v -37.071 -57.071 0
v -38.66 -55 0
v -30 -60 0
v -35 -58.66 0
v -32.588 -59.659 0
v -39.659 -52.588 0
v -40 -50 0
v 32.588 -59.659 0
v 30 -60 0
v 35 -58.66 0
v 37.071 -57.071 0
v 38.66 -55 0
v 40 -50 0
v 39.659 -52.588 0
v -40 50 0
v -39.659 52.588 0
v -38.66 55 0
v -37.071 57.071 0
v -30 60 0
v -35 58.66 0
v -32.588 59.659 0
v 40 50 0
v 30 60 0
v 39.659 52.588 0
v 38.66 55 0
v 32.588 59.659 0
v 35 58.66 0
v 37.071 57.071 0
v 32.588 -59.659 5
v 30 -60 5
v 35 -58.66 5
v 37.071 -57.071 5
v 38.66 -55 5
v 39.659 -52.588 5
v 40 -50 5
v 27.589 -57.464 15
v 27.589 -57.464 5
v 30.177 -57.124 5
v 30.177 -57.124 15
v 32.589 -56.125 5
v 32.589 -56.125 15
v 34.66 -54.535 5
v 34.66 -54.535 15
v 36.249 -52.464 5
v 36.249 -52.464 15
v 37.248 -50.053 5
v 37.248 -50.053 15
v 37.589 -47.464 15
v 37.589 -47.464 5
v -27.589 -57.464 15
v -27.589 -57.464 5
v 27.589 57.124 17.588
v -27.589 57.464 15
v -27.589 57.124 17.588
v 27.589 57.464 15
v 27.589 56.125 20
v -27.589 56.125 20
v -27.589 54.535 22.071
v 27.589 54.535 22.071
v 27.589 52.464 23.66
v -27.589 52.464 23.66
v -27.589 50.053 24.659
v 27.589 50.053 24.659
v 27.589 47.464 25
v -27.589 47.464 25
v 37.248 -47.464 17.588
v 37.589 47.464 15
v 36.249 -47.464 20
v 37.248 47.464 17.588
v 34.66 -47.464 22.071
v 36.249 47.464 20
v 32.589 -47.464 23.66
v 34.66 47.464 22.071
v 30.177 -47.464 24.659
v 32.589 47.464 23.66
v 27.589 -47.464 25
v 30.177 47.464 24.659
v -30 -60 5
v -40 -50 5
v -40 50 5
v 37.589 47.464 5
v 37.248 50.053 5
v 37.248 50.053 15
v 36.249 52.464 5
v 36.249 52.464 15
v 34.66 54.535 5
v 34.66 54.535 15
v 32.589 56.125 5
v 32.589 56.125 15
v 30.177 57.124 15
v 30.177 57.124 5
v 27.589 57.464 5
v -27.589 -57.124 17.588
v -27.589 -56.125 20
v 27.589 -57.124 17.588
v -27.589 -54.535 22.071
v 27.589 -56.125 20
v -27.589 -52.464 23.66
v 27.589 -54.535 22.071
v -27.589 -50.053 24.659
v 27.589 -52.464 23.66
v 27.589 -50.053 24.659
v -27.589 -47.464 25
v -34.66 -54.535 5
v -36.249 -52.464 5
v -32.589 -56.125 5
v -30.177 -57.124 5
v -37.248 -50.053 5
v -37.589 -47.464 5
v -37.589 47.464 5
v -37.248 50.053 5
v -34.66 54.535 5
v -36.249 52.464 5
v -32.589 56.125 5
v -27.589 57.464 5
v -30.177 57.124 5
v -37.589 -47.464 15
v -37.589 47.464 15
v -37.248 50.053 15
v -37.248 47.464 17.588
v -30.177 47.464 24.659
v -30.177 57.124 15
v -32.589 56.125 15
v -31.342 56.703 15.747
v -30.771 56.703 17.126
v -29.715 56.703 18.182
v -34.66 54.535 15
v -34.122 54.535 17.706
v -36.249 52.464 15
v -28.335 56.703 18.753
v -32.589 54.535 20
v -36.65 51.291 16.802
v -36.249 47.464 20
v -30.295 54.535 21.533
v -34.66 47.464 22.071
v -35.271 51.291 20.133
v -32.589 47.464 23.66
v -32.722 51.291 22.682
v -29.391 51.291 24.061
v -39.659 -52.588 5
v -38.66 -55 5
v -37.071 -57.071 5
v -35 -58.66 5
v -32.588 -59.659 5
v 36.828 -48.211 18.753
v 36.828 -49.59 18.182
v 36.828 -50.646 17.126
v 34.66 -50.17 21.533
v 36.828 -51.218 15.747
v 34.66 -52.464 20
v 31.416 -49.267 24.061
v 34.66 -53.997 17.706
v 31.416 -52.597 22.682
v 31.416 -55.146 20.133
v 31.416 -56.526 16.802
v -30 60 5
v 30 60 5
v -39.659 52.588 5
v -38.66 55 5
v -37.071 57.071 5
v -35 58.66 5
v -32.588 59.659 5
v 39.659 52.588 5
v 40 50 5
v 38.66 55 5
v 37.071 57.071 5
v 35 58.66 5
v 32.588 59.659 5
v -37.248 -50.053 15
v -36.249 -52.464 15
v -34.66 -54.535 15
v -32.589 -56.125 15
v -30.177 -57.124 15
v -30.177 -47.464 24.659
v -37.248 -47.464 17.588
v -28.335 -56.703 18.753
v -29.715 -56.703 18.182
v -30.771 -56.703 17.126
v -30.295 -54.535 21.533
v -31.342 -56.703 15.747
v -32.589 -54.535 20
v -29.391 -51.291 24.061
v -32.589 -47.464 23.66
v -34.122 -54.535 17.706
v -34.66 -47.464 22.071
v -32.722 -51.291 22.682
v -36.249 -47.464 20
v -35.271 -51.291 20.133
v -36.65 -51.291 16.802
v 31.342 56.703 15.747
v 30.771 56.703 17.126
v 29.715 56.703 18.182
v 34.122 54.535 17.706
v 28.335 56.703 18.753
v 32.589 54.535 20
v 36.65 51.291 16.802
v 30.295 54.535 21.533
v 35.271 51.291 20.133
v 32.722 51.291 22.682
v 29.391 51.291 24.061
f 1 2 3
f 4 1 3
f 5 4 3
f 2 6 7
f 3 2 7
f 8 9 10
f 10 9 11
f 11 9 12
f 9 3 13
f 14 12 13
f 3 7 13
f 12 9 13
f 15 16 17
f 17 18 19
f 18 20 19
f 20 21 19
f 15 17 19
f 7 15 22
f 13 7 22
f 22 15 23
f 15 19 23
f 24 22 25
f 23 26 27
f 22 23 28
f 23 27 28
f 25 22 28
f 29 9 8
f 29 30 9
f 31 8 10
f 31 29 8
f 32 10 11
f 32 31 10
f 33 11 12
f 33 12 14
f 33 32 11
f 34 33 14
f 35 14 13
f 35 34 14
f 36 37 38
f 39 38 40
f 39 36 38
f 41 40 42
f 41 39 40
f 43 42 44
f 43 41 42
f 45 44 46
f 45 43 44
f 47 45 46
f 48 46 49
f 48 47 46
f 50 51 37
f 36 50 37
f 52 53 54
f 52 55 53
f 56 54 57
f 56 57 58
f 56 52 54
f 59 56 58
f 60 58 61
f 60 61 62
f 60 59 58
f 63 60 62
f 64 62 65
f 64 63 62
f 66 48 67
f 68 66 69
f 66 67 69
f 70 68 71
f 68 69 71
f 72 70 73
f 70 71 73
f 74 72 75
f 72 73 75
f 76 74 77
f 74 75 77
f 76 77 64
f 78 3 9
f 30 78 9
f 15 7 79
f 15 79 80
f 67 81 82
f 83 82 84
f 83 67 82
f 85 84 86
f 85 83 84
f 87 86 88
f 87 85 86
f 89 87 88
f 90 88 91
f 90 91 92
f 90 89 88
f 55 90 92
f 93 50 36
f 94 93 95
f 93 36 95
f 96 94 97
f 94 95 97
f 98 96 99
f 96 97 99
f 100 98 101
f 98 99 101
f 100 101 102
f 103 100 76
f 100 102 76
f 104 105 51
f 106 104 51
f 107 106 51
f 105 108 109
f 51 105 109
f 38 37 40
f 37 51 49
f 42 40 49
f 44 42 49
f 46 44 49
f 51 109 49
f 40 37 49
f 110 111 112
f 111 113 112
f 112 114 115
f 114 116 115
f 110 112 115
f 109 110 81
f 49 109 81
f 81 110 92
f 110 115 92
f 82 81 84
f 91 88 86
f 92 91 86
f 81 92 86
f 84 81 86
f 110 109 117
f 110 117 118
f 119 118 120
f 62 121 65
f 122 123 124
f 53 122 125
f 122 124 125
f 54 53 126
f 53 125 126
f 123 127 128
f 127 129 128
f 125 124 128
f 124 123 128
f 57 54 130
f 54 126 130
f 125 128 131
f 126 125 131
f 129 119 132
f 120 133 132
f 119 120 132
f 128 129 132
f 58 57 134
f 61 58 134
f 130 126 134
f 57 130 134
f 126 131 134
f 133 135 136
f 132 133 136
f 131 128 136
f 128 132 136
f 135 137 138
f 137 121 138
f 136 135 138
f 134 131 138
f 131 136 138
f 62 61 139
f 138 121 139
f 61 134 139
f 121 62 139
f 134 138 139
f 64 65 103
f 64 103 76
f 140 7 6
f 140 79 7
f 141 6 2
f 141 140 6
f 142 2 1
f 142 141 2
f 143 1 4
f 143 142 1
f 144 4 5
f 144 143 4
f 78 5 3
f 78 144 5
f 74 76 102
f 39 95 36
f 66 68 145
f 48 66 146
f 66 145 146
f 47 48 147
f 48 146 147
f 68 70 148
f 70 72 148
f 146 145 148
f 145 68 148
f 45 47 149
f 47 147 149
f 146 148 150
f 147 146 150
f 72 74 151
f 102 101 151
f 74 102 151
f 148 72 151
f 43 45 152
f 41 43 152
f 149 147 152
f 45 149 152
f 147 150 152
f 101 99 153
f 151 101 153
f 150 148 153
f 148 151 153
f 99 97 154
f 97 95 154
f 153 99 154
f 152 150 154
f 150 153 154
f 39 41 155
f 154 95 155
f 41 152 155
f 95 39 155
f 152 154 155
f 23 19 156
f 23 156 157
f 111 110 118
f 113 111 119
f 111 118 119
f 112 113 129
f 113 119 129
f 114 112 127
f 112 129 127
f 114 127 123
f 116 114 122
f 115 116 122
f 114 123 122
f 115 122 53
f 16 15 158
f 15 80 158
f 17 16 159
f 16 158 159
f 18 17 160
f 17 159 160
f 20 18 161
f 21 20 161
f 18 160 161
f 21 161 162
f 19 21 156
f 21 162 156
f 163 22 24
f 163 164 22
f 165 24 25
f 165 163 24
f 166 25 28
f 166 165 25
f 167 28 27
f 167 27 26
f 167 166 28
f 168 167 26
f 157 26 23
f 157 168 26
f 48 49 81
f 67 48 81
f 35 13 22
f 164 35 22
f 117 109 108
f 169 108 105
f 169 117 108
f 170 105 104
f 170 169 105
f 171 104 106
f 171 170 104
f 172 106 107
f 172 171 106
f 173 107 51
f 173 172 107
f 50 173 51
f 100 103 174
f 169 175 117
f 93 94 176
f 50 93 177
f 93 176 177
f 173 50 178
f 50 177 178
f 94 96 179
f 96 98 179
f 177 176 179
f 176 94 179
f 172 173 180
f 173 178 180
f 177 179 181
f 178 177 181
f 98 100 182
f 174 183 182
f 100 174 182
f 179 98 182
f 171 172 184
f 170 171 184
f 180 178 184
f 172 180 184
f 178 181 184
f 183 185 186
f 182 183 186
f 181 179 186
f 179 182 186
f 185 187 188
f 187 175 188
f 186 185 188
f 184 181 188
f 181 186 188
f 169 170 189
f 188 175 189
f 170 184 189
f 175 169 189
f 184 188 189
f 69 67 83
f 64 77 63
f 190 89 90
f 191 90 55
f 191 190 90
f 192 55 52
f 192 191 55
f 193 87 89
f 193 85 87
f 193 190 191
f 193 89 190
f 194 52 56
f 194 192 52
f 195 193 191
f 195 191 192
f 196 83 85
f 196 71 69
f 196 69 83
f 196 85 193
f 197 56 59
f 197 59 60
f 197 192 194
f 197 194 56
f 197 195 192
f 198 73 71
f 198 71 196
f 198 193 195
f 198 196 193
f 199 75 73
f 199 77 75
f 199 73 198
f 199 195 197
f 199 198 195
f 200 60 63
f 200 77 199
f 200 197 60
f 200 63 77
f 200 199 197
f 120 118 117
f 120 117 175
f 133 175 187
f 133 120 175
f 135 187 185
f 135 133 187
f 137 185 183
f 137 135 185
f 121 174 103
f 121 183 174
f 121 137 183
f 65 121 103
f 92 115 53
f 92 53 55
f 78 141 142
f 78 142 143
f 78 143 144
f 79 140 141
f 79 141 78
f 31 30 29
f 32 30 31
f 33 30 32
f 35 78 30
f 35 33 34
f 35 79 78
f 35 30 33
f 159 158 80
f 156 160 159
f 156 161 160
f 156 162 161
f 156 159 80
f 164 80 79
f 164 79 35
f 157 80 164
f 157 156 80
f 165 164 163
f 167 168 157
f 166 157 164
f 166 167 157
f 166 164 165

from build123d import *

# Parameters (mm, degrees)
CROQUIS1_W              = 80
CROQUIS1_H              = 120
SALIENTE_EXTRUIR1_DEPTH = 5
REDONDEO2_R             = 10
CROQUIS2_W              = 75.177590538
CROQUIS2_H              = 114.928834806
SALIENTE_EXTRUIR2_DEPTH = 20
REDONDEO1_R             = 10


with BuildPart() as part:
    # Croquis1 → Saliente-Extruir1 (new body)
    with BuildSketch(Plane.XY):
        Rectangle(CROQUIS1_W, CROQUIS1_H)
    extrude(amount=SALIENTE_EXTRUIR1_DEPTH)

    # Redondeo2
    redondeo2_edges = [part.edges().sort_by_distance(p)[0] for p in [
        (-40, 60, 2.5),
        (40, 60, 2.5),
        (40, -60, 2.5),
        (-40, -60, 2.5),
    ]]
    fillet(redondeo2_edges, radius=REDONDEO2_R)


with BuildPart() as body_2:
    # Croquis2 → Saliente-Extruir2 (new body)
    with BuildSketch(Plane.XY.offset(5)):
        Rectangle(CROQUIS2_W, CROQUIS2_H)
    extrude(amount=SALIENTE_EXTRUIR2_DEPTH)

    # Redondeo1
    redondeo1_edges = [body_2.edges().sort_by_distance(p)[0] for p in [
        (-37.588795269, 0, 25),
        (0, -57.464417403, 25),
        (37.588795269, 0, 25),
        (37.588795269, -57.464417403, 15),
        (-37.588795269, -57.464417403, 15),
        (-37.588795269, 57.464417403, 15),
        (37.588795269, 57.464417403, 15),
        (0, 57.464417403, 25),
    ]]
    fillet(redondeo1_edges, radius=REDONDEO1_R)


solid = Compound([part.part, body_2.part])
